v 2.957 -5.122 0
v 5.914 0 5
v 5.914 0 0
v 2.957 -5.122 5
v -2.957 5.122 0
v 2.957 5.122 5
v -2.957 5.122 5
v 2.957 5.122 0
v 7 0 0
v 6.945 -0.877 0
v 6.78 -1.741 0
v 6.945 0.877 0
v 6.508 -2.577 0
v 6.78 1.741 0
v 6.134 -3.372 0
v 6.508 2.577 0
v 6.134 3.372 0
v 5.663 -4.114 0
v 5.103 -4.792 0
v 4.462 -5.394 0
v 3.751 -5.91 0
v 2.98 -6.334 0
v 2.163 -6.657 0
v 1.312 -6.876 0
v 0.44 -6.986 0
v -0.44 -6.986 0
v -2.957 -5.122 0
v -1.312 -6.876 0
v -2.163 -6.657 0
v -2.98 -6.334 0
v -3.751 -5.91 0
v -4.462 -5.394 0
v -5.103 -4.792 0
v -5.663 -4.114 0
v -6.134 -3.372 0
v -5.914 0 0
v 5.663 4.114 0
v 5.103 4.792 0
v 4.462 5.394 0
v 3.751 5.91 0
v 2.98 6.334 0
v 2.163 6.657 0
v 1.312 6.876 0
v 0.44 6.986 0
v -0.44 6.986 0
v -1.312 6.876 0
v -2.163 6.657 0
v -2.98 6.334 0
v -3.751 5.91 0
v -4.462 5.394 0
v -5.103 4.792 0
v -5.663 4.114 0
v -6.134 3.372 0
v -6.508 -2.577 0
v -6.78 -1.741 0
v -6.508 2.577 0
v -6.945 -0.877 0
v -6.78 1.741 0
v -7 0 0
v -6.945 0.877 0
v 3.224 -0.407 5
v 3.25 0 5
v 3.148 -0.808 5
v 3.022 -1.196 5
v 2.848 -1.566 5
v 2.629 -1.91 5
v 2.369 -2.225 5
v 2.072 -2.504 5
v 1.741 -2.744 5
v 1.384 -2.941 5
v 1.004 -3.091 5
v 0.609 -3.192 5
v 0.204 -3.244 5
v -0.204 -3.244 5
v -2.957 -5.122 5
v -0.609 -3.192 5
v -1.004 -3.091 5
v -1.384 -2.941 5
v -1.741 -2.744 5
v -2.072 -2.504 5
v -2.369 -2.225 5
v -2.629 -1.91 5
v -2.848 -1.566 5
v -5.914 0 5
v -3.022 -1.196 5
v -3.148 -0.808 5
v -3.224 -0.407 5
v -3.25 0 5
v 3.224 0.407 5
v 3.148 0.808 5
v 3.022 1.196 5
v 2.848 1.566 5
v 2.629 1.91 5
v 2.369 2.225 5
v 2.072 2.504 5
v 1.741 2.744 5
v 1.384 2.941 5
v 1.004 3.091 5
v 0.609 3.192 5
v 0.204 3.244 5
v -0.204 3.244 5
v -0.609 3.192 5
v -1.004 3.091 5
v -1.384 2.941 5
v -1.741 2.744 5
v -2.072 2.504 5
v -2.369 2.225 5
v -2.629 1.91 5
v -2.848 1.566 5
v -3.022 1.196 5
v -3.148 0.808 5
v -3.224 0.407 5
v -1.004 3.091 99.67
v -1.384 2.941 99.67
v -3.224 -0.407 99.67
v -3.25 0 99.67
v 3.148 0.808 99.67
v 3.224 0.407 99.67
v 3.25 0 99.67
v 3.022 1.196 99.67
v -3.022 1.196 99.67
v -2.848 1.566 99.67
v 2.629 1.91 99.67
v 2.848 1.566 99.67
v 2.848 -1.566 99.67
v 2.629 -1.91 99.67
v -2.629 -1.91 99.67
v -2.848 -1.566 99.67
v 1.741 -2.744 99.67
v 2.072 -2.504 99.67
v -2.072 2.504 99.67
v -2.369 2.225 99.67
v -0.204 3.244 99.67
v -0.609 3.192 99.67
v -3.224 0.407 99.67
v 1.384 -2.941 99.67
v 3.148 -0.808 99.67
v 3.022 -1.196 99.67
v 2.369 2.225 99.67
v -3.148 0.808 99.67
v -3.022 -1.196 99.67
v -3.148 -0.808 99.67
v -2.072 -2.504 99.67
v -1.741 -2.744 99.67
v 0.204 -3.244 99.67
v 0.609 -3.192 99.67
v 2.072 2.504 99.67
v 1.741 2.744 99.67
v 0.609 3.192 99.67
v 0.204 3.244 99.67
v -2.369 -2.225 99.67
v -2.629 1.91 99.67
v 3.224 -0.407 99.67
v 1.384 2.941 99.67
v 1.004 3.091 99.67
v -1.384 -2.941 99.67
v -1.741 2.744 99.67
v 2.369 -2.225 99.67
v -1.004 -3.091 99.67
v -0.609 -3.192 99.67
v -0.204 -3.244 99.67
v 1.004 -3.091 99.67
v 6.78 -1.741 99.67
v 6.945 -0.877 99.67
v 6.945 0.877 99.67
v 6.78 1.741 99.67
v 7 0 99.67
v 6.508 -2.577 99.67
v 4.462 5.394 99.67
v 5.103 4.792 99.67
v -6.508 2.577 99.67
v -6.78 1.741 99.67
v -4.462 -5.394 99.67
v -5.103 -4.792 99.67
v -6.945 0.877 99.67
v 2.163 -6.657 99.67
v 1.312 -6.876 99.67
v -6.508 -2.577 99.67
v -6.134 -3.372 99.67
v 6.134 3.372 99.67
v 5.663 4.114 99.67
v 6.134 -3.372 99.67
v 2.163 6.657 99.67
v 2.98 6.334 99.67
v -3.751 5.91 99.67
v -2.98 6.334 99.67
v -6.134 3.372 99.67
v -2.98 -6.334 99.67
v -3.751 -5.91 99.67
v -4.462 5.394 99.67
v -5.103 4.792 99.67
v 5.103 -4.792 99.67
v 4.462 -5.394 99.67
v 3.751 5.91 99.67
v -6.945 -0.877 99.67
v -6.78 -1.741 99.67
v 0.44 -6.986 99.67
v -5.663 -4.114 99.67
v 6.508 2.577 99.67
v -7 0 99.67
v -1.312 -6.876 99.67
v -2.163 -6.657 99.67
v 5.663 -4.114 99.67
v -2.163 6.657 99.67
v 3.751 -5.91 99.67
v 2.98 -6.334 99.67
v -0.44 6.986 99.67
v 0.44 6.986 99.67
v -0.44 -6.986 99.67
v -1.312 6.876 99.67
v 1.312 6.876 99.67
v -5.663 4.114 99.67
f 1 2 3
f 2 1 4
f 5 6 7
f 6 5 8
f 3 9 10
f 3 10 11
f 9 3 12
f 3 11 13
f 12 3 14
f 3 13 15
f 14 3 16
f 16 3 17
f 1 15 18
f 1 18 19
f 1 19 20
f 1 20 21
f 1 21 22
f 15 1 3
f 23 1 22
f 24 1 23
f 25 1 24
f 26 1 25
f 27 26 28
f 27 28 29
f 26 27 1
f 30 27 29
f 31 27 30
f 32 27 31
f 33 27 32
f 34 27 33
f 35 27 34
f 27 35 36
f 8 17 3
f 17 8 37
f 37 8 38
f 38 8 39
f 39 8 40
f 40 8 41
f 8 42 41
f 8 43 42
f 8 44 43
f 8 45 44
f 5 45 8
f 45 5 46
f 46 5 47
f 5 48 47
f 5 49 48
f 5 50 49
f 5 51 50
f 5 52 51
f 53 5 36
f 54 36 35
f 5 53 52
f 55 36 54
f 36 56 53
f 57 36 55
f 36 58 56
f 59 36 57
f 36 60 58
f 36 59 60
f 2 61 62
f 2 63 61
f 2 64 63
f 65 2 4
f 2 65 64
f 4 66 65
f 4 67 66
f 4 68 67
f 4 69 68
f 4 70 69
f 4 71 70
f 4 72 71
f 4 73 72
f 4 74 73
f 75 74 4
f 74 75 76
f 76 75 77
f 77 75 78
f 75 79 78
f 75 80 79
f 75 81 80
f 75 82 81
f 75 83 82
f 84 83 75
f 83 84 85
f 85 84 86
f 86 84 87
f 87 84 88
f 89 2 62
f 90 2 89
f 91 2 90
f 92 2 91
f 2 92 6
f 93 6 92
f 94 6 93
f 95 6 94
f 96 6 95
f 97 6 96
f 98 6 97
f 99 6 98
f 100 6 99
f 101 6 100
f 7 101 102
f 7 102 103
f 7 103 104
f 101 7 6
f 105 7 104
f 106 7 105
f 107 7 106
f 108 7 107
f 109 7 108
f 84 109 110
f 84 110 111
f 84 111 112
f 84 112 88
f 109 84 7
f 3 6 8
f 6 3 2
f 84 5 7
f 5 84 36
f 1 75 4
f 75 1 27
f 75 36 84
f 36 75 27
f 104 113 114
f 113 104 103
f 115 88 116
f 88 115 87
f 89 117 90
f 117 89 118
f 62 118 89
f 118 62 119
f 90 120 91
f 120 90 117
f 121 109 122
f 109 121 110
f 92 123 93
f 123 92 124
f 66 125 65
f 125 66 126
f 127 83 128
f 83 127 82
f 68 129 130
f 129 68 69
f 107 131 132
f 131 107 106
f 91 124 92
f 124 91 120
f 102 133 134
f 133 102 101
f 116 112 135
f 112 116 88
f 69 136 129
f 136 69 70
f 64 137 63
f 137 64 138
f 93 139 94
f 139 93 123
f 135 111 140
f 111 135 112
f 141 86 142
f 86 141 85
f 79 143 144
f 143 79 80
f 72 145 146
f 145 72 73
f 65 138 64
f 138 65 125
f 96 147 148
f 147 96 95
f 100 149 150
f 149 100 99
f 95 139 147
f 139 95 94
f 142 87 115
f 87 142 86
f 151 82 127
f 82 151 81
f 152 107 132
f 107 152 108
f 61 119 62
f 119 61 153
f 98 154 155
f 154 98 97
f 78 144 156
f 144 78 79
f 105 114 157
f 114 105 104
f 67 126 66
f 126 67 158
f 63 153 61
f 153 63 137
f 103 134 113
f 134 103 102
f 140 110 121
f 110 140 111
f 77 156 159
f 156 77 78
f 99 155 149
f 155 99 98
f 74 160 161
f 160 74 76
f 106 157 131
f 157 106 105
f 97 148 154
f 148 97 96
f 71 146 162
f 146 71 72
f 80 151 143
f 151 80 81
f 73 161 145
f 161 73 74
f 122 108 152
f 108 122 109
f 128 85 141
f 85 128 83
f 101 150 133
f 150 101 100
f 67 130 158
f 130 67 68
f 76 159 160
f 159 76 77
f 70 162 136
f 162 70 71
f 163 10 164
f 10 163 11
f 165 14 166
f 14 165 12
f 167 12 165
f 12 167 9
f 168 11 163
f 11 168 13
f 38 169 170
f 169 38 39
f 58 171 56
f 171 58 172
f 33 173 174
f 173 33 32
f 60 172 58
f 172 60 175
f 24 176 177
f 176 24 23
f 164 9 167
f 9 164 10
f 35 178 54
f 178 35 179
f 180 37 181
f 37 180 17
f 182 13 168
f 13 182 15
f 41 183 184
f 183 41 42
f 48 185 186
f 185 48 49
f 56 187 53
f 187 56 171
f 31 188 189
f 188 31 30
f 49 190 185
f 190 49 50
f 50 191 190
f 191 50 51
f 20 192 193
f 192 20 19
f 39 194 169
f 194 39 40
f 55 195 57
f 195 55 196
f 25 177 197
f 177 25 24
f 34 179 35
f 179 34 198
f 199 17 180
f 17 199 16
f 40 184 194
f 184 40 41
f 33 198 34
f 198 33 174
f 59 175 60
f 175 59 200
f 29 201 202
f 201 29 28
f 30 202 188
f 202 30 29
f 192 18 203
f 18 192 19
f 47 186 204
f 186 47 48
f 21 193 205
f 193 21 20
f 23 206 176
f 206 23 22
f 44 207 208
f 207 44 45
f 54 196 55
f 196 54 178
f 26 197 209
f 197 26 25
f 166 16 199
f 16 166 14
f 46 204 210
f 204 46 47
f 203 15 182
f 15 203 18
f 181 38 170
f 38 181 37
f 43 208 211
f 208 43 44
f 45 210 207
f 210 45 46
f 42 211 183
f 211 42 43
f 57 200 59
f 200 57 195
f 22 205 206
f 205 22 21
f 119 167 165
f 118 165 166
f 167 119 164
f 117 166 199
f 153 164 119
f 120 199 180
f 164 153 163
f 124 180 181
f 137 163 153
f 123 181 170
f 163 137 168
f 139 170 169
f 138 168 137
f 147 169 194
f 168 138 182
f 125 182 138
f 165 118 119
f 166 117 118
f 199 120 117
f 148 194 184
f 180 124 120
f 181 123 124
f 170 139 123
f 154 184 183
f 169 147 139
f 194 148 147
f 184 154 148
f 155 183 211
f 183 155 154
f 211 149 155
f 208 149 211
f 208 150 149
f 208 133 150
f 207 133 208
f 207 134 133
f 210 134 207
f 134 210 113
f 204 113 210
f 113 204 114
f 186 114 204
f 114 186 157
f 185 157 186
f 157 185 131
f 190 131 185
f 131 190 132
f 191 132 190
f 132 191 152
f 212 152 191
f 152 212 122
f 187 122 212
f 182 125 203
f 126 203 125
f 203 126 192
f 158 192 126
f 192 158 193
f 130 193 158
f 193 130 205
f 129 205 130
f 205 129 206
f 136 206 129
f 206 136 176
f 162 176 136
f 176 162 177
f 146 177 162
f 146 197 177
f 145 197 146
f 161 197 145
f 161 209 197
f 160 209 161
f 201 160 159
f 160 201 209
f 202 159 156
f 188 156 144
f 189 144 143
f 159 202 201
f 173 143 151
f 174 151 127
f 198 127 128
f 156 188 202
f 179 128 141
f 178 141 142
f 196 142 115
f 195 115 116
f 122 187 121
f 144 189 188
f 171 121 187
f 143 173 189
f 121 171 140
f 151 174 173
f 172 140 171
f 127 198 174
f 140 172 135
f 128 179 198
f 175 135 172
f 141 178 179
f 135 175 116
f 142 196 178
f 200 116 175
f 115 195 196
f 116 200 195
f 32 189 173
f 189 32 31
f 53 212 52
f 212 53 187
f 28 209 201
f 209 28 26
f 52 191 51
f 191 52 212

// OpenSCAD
$fn = 50;


difference() {
	union() {
		cylinder(h = 99.6700000000, r = 7.0000000000);
	}
	union() {
		translate(v = [0, 0, 0]) {
			rotate(a = [0, 0, 0]) {
				difference() {
					union() {
						#linear_extrude(height = 5) {
							polygon(points = [[5.9142500000, 0.0000000000], [2.9571250000, 5.1218907443], [-2.9571250000, 5.1218907443], [-5.9142500000, 0.0000000000], [-2.9571250000, -5.1218907443], [2.9571250000, -5.1218907443]]);
						}
					}
					union();
				}
			}
		}
		translate(v = [0, 0, -100]) {
			cylinder(h = 200, r = 3.2500000000);
		}
		translate(v = [0, 0, -100]) {
			cylinder(h = 200, r = 1.8000000000);
		}
	}
}
